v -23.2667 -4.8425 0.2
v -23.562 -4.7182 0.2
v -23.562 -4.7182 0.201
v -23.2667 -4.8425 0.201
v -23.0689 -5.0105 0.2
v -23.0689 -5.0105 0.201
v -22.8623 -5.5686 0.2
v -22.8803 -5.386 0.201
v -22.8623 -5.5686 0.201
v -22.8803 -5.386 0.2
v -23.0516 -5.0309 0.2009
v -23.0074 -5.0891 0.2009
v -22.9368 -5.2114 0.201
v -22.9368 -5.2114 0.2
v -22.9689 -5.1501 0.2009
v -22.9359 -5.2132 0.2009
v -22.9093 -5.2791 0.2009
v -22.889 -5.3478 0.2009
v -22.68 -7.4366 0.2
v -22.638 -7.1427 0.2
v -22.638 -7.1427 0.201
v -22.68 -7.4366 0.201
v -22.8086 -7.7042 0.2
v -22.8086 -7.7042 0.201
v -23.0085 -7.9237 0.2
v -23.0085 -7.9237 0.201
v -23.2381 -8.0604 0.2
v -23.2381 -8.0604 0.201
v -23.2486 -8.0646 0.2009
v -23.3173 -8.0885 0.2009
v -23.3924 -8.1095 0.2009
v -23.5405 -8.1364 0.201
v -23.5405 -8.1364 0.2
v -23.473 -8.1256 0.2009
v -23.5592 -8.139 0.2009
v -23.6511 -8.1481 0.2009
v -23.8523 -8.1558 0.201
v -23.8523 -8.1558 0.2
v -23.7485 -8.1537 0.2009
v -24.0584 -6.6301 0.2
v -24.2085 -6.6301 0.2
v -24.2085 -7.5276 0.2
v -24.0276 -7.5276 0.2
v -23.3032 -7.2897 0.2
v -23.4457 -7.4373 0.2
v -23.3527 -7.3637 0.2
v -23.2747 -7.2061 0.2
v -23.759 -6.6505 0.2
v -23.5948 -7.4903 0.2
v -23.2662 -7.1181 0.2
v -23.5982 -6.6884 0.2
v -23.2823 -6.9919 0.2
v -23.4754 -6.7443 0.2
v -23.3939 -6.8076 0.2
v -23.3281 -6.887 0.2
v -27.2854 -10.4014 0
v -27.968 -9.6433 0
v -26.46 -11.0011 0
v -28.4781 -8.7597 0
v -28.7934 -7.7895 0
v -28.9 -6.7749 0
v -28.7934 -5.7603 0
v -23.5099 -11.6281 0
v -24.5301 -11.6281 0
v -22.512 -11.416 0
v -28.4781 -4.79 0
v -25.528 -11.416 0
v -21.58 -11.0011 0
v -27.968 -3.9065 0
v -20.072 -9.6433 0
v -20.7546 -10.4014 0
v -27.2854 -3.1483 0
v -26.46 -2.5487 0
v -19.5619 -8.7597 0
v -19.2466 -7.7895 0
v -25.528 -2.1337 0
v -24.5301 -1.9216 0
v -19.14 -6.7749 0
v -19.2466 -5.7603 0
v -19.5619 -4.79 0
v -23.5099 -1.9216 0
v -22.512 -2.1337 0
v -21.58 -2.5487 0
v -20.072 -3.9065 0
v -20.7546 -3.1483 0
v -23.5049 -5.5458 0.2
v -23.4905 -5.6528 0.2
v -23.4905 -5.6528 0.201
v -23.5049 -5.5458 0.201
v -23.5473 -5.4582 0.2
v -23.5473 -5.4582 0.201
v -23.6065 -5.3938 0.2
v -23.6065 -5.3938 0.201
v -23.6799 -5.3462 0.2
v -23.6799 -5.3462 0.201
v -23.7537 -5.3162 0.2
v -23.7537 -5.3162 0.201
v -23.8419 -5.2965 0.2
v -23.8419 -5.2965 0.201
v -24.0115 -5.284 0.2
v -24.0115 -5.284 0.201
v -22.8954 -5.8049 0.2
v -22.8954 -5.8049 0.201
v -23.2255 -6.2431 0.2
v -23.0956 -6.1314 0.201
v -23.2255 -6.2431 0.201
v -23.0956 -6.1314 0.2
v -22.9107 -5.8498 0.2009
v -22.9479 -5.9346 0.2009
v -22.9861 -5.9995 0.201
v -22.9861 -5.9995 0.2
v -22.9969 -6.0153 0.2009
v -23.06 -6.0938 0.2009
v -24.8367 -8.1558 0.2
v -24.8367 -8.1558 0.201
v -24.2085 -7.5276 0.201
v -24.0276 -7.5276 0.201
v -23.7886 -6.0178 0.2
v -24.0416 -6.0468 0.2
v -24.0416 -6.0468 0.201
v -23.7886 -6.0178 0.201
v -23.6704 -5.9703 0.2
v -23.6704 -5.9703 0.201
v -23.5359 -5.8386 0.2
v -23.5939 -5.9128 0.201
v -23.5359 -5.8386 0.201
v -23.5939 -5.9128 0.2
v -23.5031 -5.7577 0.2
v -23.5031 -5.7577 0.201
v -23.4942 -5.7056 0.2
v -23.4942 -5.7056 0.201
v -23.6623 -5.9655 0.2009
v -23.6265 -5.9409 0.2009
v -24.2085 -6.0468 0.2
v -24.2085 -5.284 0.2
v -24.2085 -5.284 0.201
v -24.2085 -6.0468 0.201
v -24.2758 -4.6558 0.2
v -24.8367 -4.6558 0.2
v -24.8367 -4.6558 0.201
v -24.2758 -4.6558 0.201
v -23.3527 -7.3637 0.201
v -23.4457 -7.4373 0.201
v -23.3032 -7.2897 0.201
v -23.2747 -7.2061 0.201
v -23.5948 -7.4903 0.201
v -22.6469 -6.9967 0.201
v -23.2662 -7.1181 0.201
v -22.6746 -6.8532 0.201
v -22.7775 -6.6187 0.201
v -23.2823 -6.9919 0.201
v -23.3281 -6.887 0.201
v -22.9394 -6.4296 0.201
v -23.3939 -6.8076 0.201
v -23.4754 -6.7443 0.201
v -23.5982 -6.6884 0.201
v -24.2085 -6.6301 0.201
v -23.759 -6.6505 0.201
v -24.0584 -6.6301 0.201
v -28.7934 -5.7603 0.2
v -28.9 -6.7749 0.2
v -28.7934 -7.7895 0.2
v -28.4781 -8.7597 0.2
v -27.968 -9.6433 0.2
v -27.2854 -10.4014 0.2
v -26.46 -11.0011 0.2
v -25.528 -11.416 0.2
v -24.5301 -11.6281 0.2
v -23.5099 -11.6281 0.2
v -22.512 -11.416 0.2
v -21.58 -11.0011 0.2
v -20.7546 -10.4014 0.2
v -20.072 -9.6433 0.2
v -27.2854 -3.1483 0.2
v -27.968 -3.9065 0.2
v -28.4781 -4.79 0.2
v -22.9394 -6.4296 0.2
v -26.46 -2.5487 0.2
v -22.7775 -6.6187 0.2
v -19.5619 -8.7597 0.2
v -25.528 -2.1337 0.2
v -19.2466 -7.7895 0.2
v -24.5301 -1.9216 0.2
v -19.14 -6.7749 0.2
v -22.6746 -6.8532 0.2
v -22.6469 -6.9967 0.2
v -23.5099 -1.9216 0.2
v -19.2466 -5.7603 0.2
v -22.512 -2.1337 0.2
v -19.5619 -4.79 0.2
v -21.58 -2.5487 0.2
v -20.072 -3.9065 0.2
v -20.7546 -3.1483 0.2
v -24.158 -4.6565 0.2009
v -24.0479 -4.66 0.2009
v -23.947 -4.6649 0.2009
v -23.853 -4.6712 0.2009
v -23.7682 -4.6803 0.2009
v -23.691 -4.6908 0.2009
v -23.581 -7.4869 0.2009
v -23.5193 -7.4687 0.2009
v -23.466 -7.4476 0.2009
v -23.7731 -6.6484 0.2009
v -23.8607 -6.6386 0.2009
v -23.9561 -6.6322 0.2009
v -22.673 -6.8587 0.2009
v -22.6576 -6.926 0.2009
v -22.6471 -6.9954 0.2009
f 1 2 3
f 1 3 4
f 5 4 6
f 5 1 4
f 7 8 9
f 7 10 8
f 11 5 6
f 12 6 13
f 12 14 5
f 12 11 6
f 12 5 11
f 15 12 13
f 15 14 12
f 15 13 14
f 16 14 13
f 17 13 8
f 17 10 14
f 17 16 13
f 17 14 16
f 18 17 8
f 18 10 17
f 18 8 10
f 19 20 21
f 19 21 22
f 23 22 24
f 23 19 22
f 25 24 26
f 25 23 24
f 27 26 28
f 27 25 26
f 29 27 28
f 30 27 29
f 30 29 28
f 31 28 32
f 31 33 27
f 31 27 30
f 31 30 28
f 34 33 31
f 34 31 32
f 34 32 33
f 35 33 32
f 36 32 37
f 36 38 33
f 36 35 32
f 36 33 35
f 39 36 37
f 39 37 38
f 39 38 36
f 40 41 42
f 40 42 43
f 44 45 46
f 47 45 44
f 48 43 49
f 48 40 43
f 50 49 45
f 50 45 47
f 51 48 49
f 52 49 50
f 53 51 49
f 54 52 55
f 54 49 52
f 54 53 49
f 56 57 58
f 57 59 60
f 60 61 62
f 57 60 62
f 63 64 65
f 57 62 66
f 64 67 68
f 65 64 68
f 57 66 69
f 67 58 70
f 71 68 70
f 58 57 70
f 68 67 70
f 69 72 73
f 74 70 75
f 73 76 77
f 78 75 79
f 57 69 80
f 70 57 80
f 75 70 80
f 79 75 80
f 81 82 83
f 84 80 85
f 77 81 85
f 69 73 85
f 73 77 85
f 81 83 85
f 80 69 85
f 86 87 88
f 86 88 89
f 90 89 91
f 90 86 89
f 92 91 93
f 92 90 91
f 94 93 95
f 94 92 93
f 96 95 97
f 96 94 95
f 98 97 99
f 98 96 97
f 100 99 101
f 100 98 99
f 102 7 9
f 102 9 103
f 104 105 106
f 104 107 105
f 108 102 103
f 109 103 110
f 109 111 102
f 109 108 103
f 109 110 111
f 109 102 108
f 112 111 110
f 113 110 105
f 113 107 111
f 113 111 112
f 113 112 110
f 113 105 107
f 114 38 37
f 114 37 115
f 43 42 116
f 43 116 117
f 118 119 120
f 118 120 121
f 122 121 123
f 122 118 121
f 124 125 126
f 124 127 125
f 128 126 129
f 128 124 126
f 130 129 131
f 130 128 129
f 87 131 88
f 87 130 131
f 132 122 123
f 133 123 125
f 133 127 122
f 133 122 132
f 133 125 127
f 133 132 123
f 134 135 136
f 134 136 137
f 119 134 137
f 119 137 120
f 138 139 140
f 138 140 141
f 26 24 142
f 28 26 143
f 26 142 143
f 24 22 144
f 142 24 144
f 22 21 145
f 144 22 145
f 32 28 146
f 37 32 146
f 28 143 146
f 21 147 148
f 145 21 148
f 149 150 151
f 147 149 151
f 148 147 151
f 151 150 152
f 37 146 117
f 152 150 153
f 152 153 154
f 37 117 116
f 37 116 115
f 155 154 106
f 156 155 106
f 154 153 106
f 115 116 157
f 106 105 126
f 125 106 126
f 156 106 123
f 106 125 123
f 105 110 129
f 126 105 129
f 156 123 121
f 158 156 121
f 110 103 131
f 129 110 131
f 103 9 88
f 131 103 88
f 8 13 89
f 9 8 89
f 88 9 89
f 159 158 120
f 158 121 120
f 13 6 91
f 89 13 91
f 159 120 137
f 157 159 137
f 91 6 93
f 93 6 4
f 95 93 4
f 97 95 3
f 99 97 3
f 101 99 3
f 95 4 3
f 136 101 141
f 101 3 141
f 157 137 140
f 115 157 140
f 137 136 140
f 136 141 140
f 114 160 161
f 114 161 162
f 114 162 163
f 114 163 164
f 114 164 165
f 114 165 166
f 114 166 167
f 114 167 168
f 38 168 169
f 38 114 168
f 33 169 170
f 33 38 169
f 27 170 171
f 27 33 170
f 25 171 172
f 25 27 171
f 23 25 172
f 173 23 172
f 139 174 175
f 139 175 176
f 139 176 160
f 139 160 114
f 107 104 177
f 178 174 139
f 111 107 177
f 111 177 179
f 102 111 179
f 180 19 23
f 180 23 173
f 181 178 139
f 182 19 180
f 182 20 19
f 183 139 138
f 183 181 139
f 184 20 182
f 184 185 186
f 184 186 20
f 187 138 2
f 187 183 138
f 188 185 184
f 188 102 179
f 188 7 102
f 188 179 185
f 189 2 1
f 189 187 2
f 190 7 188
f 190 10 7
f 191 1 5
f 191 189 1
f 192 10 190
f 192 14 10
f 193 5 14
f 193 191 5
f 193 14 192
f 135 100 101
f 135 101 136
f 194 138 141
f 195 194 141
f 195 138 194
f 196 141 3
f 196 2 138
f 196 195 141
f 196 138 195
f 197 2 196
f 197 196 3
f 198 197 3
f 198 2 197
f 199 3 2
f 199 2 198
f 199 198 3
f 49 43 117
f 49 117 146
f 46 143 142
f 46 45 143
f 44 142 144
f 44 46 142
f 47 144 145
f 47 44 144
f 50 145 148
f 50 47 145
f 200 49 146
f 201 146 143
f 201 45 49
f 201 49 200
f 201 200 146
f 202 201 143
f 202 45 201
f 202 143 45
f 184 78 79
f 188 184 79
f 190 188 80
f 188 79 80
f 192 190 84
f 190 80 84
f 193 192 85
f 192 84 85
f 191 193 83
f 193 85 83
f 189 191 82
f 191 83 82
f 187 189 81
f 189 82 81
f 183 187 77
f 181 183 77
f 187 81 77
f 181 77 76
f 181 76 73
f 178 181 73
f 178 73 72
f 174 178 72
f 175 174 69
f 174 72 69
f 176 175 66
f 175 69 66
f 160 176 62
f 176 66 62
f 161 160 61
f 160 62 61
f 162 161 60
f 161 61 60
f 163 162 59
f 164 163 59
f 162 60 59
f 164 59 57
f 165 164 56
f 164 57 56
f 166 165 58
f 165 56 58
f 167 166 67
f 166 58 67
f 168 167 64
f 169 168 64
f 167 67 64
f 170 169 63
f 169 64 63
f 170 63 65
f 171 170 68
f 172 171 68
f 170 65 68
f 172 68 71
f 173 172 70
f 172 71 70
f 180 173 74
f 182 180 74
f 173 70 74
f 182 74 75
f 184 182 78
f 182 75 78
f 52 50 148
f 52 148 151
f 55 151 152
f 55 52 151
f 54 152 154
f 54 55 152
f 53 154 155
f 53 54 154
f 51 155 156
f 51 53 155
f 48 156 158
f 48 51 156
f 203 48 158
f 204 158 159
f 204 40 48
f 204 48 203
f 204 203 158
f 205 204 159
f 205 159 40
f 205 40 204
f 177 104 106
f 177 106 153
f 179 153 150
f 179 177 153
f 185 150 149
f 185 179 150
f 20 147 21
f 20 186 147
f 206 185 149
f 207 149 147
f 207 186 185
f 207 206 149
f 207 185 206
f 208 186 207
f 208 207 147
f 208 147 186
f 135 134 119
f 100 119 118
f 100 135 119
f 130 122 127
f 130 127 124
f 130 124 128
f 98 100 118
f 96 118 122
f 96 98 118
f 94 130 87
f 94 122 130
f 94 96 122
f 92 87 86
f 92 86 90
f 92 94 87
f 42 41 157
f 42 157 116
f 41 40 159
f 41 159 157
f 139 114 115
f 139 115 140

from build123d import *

# Parameters (mm, degrees)
SKETCH1_R           = 4.88
BOSS_EXTRUDE1_DEPTH = 0.2
BOSS_EXTRUDE2_DEPTH = 0.001


with BuildPart() as part:
    # Sketch1 → Boss-Extrude1 (new body)
    with BuildSketch(Plane.XY):
        with Locations((-24.02000111, -6.774872108)):
            Circle(SKETCH1_R)
    extrude(amount=BOSS_EXTRUDE1_DEPTH)

    # Sketch3 → Boss-Extrude2 (add)
    with BuildSketch(Plane.XY.offset(0.2)):
        with BuildLine():
            Line((-24.836675582, -8.155782129), (-24.836675582, -4.655782129))
            Line((-24.836675582, -4.655782129), (-24.275778146, -4.655782129))
            add(Edge.make_bspline(
                [(-24.275778146, -4.655782129), (-24.236511819, -4.655777648), (-24.160532219, -4.655768977), (-24.050913486, -4.659618427), (-23.949251368, -4.664598122), (-23.855869395, -4.670169242), (-23.770608623, -4.679769396), (-23.693598705, -4.68988691), (-23.624685775, -4.702088007), (-23.582080655, -4.71303277), (-23.562036159, -4.718181969)],
                knots=[0, 0, 0, 0, 1.311965854, 2.538629056, 3.664479157, 4.713267157, 5.663616078, 6.530575999, 7.308677837, 8, 8, 8, 8], degree=3))
            add(Edge.make_bspline(
                [(-23.562036159, -4.718181969), (-23.535715701, -4.725445006), (-23.484066512, -4.739697417), (-23.410088391, -4.768480776), (-23.339909823, -4.800475521), (-23.273616496, -4.836975541), (-23.211615476, -4.878421493), (-23.154142389, -4.925142306), (-23.099957682, -4.975262607), (-23.05098533, -5.030179235), (-23.006722392, -5.088208826), (-22.968265836, -5.149336173), (-22.934852017, -5.2126266), (-22.90811221, -5.278876575), (-22.887964268, -5.347780999), (-22.873228147, -5.419045639), (-22.863677145, -5.492895994), (-22.8627747, -5.543138805), (-22.862316608, -5.568642706)],
                knots=[0, 0, 0, 0, 1.099996261, 2.158545794, 3.195537121, 4.207578794, 5.205712374, 6.197378256, 7.190519799, 8.17788031, 9.159561366, 10.129234751, 11.085776129, 12.040971148, 13.00380137, 13.975669004, 14.972423361, 16, 16, 16, 16], degree=3))
            add(Edge.make_bspline(
                [(-22.862316608, -5.568642706), (-22.863514384, -5.601408525), (-22.865872058, -5.665904014), (-22.880933042, -5.760636218), (-22.909174734, -5.850171768), (-22.946128301, -5.936160769), (-22.996373599, -6.018282481), (-23.06017541, -6.096497859), (-23.136500353, -6.17321527), (-23.195045798, -6.219202183), (-23.225497698, -6.243121873)],
                knots=[0, 0, 0, 0, 0.986156485, 1.941127874, 2.875419072, 3.804401753, 4.751181392, 5.761612777, 6.835722519, 8, 8, 8, 8], degree=3))
            add(Edge.make_bspline(
                [(-23.225497698, -6.243121873), (-23.200820939, -6.255719144), (-23.152436643, -6.280418908), (-23.083745156, -6.321017946), (-23.020144338, -6.364200172), (-22.961349022, -6.409096743), (-22.908592505, -6.457610888), (-22.859696385, -6.506947156), (-22.81707294, -6.559932311), (-22.778957771, -6.61467786), (-22.745828686, -6.671976526), (-22.716976906, -6.731731543), (-22.692606843, -6.794147048), (-22.671969642, -6.858905396), (-22.656578413, -6.926229327), (-22.646543004, -6.996142917), (-22.638859268, -7.068407727), (-22.638261545, -7.11763271), (-22.637957634, -7.142661136)],
                knots=[0, 0, 0, 0, 1.164658916, 2.283573913, 3.35186032, 4.395461096, 5.390182219, 6.362969632, 7.312859996, 8.245001507, 9.165155236, 10.092416118, 11.032087915, 11.979892451, 12.947605196, 13.931445124, 14.948243989, 16, 16, 16, 16], degree=3))
            add(Edge.make_bspline(
                [(-22.637957634, -7.142661136), (-22.639929818, -7.190463998), (-22.643821916, -7.284802755), (-22.672279037, -7.423313716), (-22.721614642, -7.554634671), (-22.787862186, -7.678243692), (-22.869491907, -7.790562503), (-22.963342678, -7.888952806), (-23.068469636, -7.972238013), (-23.16546196, -8.028449067), (-23.249352683, -8.06617194), (-23.318837801, -8.0894946), (-23.393463346, -8.111100676), (-23.474596277, -8.126272909), (-23.560765765, -8.140160205), (-23.652811968, -8.148734509), (-23.750562854, -8.154545104), (-23.817702388, -8.155361451), (-23.852300582, -8.155782129)],
                knots=[0, 0, 0, 0, 1.284142165, 2.534249414, 3.780121997, 5.041676246, 6.291546858, 7.49970053, 8.684500223, 9.883330709, 10.50184324, 11.153274765, 11.851151195, 12.587658647, 13.369265475, 14.195992086, 15.070362669, 16, 16, 16, 16], degree=3))
            Line((-23.852300582, -8.155782129), (-24.836675582, -8.155782129))
        make_face()
        with BuildLine():
            Line((-24.208470454, -5.283987258), (-24.208470454, -6.04680777))
            Line((-24.208470454, -6.04680777), (-24.041603467, -6.04680777))
            add(Edge.make_bspline(
                [(-24.041603467, -6.04680777), (-24.018924744, -6.046610003), (-23.975144842, -6.046228226), (-23.911909418, -6.041311067), (-23.853110685, -6.032922088), (-23.798971656, -6.021217352), (-23.748988004, -6.006354044), (-23.70347904, -5.988470283), (-23.662644859, -5.966650151), (-23.615204985, -5.934148102), (-23.565057617, -5.886319881), (-23.520913454, -5.817222107), (-23.494912836, -5.737759929), (-23.492017068, -5.681717049), (-23.490521736, -5.652777322)],
                knots=[0, 0, 0, 0, 1.065314748, 2.056525647, 2.977365736, 3.853934255, 4.656397591, 5.425096493, 6.14721249, 6.826394842, 8.123232004, 9.372140726, 10.643011755, 12, 12, 12, 12], degree=3))
            add(Edge.make_bspline(
                [(-23.490521736, -5.652777322), (-23.491718276, -5.625670459), (-23.494031737, -5.573260429), (-23.520211016, -5.49967208), (-23.560872612, -5.434457742), (-23.608879341, -5.389823861), (-23.654087005, -5.359340236), (-23.692796581, -5.339268067), (-23.735283248, -5.321299666), (-23.782369501, -5.307560589), (-23.833786453, -5.29725127), (-23.889284342, -5.289680309), (-23.948958922, -5.284527191), (-23.990176282, -5.284171096), (-24.01145523, -5.283987258)],
                knots=[0, 0, 0, 0, 1.347982417, 2.606269829, 3.849316587, 5.153353503, 5.842674298, 6.568177932, 7.326619318, 8.142485038, 9.012069166, 9.942760135, 10.937925643, 12, 12, 12, 12], degree=3))
            Line((-24.01145523, -5.283987258), (-24.208470454, -5.283987258))
        make_face(mode=Mode.SUBTRACT)
        with BuildLine():
            Line((-24.208470454, -6.630141104), (-24.208470454, -7.527577001))
            Line((-24.208470454, -7.527577001), (-24.027581031, -7.527577001))
            add(Edge.make_bspline(
                [(-24.027581031, -7.527577001), (-23.991818962, -7.527372694), (-23.923061921, -7.526979887), (-23.824567582, -7.522233852), (-23.735011604, -7.513679959), (-23.654631277, -7.503001112), (-23.583303484, -7.488532946), (-23.521269328, -7.470138526), (-23.467678092, -7.449901461), (-23.422851113, -7.424906282), (-23.386230038, -7.395818093), (-23.353183358, -7.366089264), (-23.326239154, -7.331794252), (-23.304920397, -7.294405246), (-23.286469051, -7.254851016), (-23.275340502, -7.211586983), (-23.266867615, -7.165895389), (-23.266401329, -7.134291502), (-23.266162762, -7.118121873)],
                knots=[0, 0, 0, 0, 1.753078804, 3.370512758, 4.83203934, 6.162291463, 7.344201807, 8.395507345, 9.331626367, 10.147333109, 10.898971645, 11.62040215, 12.321813352, 13.025280112, 13.727906689, 14.453419512, 15.208716525, 16, 16, 16, 16], degree=3))
            add(Edge.make_bspline(
                [(-23.266162762, -7.118121873), (-23.266688872, -7.099631647), (-23.267713593, -7.063617662), (-23.276082503, -7.010979379), (-23.291291546, -6.961838049), (-23.310448079, -6.914937062), (-23.337105411, -6.871955637), (-23.368786739, -6.83140635), (-23.407065872, -6.794662324), (-23.450112989, -6.759501145), (-23.50032319, -6.728715627), (-23.557720031, -6.702003737), (-23.622615324, -6.679694951), (-23.695210087, -6.66193268), (-23.775186072, -6.646858087), (-23.863127016, -6.63785689), (-23.958300515, -6.631162305), (-24.024295368, -6.630489239), (-24.05843039, -6.630141104)],
                knots=[0, 0, 0, 0, 0.845221588, 1.646264278, 2.427170338, 3.19324141, 3.95557735, 4.731569926, 5.540061037, 6.376114724, 7.268642756, 8.224665384, 9.265483498, 10.400594375, 11.639216012, 12.983232105, 14.439614077, 16, 16, 16, 16], degree=3))
            Line((-24.05843039, -6.630141104), (-24.208470454, -6.630141104))
        make_face(mode=Mode.SUBTRACT)
    extrude(amount=BOSS_EXTRUDE2_DEPTH)


solid = part.part
